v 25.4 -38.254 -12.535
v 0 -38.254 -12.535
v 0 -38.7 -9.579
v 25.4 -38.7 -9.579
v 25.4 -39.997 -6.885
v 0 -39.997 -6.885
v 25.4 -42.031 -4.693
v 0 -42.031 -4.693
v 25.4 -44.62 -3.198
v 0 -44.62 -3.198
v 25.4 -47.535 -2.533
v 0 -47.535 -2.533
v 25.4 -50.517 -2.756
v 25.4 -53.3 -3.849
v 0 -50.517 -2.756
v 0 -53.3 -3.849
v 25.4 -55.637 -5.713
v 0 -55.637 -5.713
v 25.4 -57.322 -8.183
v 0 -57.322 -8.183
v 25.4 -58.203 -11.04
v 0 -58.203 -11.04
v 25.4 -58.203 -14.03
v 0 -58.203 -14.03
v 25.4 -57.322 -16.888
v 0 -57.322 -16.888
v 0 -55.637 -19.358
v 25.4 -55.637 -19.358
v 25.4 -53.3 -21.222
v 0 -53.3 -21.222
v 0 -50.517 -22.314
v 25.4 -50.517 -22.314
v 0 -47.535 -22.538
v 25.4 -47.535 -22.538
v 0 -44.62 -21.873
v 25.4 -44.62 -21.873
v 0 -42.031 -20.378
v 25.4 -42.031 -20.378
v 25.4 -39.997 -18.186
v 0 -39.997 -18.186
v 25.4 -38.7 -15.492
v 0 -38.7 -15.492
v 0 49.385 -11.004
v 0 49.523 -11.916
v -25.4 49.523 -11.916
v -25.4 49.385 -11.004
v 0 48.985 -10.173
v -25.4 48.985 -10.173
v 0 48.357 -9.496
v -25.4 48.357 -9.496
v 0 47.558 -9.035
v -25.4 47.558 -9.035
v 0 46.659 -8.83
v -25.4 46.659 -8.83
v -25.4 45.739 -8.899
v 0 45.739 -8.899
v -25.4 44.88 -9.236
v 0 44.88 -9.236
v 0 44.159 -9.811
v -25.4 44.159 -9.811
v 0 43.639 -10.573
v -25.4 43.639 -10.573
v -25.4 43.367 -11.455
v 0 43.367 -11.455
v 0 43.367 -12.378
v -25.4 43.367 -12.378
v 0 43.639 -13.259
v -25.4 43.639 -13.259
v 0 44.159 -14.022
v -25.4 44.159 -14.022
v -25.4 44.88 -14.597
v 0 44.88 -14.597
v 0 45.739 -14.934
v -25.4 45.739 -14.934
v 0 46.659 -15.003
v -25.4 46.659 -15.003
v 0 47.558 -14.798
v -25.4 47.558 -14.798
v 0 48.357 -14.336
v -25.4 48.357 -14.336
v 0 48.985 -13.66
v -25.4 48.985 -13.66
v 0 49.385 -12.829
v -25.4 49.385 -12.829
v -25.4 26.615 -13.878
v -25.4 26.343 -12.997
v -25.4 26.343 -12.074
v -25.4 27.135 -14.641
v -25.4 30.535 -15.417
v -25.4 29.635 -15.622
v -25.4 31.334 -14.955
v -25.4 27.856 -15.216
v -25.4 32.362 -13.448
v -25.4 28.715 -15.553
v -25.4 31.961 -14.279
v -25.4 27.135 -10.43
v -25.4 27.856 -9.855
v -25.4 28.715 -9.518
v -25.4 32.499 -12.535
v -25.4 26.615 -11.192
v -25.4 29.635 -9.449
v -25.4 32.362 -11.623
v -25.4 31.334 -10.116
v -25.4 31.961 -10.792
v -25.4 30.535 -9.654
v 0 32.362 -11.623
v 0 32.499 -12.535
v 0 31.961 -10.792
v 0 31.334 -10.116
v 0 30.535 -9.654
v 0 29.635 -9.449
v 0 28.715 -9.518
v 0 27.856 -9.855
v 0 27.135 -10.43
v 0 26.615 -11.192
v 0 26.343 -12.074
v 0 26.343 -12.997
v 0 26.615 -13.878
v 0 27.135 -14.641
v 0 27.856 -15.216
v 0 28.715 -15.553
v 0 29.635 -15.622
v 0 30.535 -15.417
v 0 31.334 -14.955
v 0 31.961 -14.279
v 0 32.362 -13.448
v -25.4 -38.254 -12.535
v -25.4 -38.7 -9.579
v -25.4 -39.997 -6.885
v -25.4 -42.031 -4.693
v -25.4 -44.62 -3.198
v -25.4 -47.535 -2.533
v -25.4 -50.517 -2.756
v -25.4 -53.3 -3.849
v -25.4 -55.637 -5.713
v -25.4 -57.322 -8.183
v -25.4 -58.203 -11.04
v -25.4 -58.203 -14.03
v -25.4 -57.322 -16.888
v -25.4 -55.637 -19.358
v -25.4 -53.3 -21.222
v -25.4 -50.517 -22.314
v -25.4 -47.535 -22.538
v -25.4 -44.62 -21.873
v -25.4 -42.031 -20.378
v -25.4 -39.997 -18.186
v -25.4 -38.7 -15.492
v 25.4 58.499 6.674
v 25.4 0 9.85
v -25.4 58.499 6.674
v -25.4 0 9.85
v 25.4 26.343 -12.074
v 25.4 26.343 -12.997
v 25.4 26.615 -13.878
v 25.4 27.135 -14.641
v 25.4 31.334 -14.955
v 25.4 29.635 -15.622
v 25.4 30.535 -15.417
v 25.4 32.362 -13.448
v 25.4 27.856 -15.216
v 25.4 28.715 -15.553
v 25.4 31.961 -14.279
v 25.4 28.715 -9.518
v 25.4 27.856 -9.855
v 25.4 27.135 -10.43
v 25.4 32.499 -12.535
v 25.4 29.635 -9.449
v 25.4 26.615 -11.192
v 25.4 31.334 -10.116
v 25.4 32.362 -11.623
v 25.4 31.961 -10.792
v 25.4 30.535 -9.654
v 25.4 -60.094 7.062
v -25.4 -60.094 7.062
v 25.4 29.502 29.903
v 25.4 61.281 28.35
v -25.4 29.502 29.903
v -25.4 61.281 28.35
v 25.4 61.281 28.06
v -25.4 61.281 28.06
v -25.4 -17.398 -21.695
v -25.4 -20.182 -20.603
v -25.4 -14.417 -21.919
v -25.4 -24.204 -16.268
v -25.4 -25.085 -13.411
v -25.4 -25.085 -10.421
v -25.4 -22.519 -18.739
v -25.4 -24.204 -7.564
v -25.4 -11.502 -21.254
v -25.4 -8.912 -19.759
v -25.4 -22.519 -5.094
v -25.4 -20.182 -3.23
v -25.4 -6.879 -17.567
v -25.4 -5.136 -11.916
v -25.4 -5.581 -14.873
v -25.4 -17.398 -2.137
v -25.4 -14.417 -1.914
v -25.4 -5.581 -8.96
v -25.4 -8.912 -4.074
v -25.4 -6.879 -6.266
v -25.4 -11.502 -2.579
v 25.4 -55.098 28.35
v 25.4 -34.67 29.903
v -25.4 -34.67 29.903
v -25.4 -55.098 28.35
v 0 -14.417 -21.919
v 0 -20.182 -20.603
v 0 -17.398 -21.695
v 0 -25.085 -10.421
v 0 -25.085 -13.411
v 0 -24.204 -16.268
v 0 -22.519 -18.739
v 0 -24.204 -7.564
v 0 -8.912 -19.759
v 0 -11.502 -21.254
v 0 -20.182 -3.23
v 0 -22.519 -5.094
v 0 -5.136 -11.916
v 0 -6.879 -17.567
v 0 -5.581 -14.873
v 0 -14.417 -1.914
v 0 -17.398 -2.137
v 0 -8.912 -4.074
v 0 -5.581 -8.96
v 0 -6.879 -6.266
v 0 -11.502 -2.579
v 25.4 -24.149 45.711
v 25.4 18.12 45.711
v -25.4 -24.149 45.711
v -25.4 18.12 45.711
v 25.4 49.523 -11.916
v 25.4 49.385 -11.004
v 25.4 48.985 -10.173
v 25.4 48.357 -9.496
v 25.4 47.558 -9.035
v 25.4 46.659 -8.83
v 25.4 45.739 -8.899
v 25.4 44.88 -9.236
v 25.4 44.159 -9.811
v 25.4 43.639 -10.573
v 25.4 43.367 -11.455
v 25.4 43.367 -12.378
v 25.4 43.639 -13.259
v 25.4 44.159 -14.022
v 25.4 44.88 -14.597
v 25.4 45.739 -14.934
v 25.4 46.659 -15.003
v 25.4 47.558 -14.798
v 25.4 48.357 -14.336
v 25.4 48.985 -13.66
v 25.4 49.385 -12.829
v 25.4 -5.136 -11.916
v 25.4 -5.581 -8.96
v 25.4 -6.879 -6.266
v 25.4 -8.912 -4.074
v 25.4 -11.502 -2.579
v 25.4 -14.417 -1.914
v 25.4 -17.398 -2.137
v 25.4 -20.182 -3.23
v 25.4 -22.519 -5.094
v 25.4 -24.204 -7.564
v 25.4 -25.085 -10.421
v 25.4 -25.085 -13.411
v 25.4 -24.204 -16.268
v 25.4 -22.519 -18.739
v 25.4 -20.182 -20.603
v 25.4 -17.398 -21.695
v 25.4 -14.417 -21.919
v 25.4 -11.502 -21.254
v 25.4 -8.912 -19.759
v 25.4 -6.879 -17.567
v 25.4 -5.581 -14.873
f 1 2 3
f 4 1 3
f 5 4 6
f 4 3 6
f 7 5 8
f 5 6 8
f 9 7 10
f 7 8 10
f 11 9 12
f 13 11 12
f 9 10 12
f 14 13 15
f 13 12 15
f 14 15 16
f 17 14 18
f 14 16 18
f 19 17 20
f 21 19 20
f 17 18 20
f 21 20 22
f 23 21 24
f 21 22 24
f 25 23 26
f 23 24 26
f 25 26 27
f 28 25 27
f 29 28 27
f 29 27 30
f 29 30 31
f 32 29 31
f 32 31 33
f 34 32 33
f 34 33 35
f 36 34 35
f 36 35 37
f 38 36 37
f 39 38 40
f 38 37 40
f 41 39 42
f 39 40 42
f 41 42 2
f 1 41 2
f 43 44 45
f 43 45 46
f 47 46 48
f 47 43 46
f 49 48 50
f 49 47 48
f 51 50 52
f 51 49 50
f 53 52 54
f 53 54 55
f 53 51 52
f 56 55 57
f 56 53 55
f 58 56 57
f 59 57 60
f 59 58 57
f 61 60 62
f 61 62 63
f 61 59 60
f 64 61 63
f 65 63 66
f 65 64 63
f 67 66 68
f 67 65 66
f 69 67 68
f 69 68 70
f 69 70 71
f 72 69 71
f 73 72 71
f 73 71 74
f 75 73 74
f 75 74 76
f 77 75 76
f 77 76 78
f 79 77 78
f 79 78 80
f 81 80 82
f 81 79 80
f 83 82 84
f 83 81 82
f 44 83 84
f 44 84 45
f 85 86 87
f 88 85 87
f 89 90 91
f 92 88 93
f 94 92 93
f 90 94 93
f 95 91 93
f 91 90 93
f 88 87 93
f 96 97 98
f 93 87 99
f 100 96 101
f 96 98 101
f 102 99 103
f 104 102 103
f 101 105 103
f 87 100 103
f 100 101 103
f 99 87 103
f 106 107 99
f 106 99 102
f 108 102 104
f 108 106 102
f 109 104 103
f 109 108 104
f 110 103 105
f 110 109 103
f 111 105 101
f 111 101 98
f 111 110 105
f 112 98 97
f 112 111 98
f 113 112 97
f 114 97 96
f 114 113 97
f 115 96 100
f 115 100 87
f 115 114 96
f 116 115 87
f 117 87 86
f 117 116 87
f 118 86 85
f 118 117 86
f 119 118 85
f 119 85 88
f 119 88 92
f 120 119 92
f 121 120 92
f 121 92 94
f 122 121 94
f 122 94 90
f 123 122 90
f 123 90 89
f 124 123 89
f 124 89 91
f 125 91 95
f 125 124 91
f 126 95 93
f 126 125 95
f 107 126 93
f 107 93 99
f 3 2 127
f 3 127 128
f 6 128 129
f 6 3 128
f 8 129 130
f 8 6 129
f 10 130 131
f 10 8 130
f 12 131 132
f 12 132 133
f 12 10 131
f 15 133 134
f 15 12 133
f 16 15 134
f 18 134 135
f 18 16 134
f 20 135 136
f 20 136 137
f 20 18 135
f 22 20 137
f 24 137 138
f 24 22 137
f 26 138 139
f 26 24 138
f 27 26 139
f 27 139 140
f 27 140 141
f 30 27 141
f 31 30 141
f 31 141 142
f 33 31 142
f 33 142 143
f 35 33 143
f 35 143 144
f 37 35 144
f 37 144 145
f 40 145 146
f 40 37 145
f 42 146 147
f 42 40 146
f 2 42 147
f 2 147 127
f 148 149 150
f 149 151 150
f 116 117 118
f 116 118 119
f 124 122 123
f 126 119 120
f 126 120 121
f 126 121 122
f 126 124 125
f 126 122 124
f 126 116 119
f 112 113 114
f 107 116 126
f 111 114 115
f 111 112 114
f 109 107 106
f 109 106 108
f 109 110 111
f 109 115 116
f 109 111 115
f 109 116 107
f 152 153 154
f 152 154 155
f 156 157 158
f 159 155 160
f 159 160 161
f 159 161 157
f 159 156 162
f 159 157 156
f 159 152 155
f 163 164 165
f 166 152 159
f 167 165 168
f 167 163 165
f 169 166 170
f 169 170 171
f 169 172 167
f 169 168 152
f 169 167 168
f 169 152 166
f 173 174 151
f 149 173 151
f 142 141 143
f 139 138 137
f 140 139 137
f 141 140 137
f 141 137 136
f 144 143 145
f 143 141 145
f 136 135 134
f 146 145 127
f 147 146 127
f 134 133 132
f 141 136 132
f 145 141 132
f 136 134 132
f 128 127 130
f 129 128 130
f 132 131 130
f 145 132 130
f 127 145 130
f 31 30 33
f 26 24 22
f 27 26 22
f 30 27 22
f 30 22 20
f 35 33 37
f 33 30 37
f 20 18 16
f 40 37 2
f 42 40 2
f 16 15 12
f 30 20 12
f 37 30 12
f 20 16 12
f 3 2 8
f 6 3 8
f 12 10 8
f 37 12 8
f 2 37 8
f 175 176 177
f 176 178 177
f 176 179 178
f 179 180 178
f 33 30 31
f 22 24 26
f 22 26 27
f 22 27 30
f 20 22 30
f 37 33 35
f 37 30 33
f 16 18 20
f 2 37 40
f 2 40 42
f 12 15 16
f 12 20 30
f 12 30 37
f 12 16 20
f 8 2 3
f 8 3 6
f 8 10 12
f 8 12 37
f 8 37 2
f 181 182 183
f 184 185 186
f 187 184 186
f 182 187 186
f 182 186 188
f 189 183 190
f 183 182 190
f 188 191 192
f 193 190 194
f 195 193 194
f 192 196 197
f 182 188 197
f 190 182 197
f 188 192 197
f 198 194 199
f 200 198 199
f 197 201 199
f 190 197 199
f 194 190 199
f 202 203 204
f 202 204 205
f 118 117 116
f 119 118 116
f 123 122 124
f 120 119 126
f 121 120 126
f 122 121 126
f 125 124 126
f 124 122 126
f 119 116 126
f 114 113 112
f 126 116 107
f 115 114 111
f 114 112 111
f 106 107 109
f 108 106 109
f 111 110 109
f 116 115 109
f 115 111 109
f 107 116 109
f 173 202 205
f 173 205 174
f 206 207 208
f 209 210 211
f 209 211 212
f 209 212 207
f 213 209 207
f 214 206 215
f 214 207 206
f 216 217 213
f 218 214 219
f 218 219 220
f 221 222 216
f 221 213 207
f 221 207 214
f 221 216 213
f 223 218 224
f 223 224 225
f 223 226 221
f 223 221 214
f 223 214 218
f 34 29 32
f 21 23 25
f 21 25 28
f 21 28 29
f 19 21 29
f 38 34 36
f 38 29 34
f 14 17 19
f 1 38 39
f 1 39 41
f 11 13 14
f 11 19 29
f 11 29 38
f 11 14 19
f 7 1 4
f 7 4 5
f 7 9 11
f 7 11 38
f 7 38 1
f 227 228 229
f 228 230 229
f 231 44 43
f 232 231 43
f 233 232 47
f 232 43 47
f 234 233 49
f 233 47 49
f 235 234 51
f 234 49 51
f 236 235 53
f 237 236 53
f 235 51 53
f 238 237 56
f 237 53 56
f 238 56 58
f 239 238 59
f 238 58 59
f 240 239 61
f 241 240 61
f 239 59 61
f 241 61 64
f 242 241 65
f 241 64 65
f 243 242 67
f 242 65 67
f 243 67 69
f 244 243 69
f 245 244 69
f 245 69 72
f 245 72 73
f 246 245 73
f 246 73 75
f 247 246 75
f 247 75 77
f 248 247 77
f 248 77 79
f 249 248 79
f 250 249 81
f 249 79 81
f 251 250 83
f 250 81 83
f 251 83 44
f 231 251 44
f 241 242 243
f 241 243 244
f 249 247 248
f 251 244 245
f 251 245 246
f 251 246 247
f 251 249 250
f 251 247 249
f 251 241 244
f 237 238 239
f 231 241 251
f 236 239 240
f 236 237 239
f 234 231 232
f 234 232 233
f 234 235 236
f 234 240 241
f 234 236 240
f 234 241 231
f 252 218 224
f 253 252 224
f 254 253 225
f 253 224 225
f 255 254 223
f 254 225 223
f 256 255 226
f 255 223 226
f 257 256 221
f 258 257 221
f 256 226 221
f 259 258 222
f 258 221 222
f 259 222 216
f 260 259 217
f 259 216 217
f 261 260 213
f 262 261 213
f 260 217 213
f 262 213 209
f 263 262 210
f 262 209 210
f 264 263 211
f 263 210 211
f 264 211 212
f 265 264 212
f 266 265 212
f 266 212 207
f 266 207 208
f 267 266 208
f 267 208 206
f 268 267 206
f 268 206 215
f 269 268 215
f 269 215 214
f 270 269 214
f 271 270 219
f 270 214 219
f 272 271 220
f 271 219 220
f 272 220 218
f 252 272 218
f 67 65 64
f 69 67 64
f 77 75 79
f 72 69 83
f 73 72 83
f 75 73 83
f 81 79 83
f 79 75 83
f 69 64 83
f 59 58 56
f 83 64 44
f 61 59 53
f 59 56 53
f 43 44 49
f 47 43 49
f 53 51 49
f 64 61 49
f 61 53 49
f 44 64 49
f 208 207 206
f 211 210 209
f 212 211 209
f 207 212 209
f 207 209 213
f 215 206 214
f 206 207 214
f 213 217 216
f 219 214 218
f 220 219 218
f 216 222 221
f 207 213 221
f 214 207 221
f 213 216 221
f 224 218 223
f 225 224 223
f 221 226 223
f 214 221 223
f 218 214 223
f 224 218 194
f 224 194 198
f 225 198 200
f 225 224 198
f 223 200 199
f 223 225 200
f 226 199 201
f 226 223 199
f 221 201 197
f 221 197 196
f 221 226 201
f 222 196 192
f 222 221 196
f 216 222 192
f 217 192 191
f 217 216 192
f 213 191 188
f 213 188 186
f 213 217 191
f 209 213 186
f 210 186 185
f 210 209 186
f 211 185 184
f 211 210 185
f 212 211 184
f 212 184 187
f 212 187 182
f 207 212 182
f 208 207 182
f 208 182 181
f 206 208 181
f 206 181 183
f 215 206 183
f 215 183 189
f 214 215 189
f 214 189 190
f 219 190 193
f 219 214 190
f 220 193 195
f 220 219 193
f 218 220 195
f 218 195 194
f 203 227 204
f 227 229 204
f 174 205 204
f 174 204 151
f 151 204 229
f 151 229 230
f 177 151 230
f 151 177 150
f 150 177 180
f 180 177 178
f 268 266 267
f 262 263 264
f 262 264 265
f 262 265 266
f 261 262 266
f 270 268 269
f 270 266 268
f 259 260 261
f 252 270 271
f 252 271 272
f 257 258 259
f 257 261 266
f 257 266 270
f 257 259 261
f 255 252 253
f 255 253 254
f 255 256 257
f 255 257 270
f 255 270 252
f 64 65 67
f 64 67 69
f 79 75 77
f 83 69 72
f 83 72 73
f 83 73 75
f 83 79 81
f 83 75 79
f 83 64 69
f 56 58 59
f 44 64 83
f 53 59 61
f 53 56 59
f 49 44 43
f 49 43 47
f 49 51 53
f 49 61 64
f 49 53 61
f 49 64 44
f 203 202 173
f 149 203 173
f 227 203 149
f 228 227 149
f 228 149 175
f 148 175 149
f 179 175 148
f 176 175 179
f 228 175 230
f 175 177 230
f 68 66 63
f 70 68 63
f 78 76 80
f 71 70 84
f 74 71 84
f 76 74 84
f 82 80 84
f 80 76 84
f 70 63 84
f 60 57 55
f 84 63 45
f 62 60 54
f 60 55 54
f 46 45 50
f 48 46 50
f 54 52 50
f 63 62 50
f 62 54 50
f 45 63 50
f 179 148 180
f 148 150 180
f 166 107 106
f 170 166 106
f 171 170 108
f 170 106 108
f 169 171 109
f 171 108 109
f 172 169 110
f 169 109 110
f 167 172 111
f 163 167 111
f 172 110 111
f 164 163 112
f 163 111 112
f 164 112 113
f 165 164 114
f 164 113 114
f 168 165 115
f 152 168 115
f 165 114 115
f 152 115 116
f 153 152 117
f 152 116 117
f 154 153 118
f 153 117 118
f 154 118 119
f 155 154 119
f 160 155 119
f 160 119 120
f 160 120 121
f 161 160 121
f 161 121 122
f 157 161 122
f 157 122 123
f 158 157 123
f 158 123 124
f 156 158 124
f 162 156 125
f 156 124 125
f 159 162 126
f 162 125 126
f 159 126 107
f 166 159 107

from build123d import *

# Parameters (mm, degrees)
F1_DEPTH = 25.4
F0_R     = 10.0305561335
F0_R_2   = 3.0951686204
F3_DEPTH = 25.4
F2_R     = 10.0305561335
F2_R_2   = 3.0951686204


with BuildPart() as f1:
    # F0 (on Right) → F1 (new body)
    with BuildSketch(Plane.YZ):
        Polygon((-55.0975427032, 28.3502675593), (-60.0938091379, 7.062059809), (0, 9.8499162998), (58.4986023605, 6.6740531474), (61.2806901336, 28.0596334487), (61.2806901336, 28.3502675593), (29.5018939694, 29.9033019692), (18.1195573523, 45.7114391029), (-24.1487864405, 45.7114391029), (-34.6697121859, 29.9033019692), align=None)
    extrude(amount=-F1_DEPTH)

    # F2 (on Right) → F3 (join)
    with BuildSketch(Plane.YZ):
        Polygon((-60.0938091379, 7.062059809), (0, 9.8499162998), (58.4986023605, 6.6740531474), (61.2806901336, 28.0596334487), (61.2806901336, 28.3502675593), (29.5018939694, 29.9033019692), (18.1195573523, 45.7114391029), (-24.1487864405, 45.7114391029), (-34.6697121859, 29.9033019692), (-55.0975427032, 28.3502675593), align=None)
    extrude(amount=F3_DEPTH)


with BuildPart() as f1b:
    # F0 (on Right) → F1, piece 2 (new body)
    with BuildSketch(Plane.YZ):
        with Locations((-48.2845641673, -12.5354165211)):
            Circle(F0_R)
    extrude(amount=-F1_DEPTH)


with BuildPart() as f1c:
    # F0 (on Right) → F1, piece 3 (new body)
    with BuildSketch(Plane.YZ):
        with Locations((-15.1663050056, -11.9163831696)):
            Circle(F0_R)
    extrude(amount=-F1_DEPTH)


with BuildPart() as f1d:
    # F0 (on Right) → F1, piece 4 (new body)
    with BuildSketch(Plane.YZ):
        with Locations((46.4274659753, -11.9163831696)):
            Circle(F0_R_2)
    extrude(amount=-F1_DEPTH)


with BuildPart() as f1e:
    # F0 (on Right) → F1, piece 5 (new body)
    with BuildSketch(Plane.YZ):
        with Locations((29.4040646404, -12.5354165211)):
            Circle(F0_R_2)
    extrude(amount=-F1_DEPTH)


with BuildPart() as f3:
    # F2 (on Right) → F3, piece 2 (new body)
    with BuildSketch(Plane.YZ):
        with Locations((-48.2845641673, -12.5354165211)):
            Circle(F2_R)
    extrude(amount=F3_DEPTH)


with BuildPart() as f3b:
    # F2 (on Right) → F3, piece 3 (new body)
    with BuildSketch(Plane.YZ):
        with Locations((-15.1663050056, -11.9163831696)):
            Circle(F2_R)
    extrude(amount=F3_DEPTH)


with BuildPart() as f3c:
    # F2 (on Right) → F3, piece 4 (new body)
    with BuildSketch(Plane.YZ):
        with Locations((46.4274659753, -11.9163831696)):
            Circle(F2_R_2)
    extrude(amount=F3_DEPTH)


with BuildPart() as f3d:
    # F2 (on Right) → F3, piece 5 (new body)
    with BuildSketch(Plane.YZ):
        with Locations((29.4040646404, -12.5354165211)):
            Circle(F2_R_2)
    extrude(amount=F3_DEPTH)


solid = Compound([f1.part, f1b.part, f1c.part, f1d.part, f1e.part, f3.part, f3b.part, f3c.part, f3d.part])
